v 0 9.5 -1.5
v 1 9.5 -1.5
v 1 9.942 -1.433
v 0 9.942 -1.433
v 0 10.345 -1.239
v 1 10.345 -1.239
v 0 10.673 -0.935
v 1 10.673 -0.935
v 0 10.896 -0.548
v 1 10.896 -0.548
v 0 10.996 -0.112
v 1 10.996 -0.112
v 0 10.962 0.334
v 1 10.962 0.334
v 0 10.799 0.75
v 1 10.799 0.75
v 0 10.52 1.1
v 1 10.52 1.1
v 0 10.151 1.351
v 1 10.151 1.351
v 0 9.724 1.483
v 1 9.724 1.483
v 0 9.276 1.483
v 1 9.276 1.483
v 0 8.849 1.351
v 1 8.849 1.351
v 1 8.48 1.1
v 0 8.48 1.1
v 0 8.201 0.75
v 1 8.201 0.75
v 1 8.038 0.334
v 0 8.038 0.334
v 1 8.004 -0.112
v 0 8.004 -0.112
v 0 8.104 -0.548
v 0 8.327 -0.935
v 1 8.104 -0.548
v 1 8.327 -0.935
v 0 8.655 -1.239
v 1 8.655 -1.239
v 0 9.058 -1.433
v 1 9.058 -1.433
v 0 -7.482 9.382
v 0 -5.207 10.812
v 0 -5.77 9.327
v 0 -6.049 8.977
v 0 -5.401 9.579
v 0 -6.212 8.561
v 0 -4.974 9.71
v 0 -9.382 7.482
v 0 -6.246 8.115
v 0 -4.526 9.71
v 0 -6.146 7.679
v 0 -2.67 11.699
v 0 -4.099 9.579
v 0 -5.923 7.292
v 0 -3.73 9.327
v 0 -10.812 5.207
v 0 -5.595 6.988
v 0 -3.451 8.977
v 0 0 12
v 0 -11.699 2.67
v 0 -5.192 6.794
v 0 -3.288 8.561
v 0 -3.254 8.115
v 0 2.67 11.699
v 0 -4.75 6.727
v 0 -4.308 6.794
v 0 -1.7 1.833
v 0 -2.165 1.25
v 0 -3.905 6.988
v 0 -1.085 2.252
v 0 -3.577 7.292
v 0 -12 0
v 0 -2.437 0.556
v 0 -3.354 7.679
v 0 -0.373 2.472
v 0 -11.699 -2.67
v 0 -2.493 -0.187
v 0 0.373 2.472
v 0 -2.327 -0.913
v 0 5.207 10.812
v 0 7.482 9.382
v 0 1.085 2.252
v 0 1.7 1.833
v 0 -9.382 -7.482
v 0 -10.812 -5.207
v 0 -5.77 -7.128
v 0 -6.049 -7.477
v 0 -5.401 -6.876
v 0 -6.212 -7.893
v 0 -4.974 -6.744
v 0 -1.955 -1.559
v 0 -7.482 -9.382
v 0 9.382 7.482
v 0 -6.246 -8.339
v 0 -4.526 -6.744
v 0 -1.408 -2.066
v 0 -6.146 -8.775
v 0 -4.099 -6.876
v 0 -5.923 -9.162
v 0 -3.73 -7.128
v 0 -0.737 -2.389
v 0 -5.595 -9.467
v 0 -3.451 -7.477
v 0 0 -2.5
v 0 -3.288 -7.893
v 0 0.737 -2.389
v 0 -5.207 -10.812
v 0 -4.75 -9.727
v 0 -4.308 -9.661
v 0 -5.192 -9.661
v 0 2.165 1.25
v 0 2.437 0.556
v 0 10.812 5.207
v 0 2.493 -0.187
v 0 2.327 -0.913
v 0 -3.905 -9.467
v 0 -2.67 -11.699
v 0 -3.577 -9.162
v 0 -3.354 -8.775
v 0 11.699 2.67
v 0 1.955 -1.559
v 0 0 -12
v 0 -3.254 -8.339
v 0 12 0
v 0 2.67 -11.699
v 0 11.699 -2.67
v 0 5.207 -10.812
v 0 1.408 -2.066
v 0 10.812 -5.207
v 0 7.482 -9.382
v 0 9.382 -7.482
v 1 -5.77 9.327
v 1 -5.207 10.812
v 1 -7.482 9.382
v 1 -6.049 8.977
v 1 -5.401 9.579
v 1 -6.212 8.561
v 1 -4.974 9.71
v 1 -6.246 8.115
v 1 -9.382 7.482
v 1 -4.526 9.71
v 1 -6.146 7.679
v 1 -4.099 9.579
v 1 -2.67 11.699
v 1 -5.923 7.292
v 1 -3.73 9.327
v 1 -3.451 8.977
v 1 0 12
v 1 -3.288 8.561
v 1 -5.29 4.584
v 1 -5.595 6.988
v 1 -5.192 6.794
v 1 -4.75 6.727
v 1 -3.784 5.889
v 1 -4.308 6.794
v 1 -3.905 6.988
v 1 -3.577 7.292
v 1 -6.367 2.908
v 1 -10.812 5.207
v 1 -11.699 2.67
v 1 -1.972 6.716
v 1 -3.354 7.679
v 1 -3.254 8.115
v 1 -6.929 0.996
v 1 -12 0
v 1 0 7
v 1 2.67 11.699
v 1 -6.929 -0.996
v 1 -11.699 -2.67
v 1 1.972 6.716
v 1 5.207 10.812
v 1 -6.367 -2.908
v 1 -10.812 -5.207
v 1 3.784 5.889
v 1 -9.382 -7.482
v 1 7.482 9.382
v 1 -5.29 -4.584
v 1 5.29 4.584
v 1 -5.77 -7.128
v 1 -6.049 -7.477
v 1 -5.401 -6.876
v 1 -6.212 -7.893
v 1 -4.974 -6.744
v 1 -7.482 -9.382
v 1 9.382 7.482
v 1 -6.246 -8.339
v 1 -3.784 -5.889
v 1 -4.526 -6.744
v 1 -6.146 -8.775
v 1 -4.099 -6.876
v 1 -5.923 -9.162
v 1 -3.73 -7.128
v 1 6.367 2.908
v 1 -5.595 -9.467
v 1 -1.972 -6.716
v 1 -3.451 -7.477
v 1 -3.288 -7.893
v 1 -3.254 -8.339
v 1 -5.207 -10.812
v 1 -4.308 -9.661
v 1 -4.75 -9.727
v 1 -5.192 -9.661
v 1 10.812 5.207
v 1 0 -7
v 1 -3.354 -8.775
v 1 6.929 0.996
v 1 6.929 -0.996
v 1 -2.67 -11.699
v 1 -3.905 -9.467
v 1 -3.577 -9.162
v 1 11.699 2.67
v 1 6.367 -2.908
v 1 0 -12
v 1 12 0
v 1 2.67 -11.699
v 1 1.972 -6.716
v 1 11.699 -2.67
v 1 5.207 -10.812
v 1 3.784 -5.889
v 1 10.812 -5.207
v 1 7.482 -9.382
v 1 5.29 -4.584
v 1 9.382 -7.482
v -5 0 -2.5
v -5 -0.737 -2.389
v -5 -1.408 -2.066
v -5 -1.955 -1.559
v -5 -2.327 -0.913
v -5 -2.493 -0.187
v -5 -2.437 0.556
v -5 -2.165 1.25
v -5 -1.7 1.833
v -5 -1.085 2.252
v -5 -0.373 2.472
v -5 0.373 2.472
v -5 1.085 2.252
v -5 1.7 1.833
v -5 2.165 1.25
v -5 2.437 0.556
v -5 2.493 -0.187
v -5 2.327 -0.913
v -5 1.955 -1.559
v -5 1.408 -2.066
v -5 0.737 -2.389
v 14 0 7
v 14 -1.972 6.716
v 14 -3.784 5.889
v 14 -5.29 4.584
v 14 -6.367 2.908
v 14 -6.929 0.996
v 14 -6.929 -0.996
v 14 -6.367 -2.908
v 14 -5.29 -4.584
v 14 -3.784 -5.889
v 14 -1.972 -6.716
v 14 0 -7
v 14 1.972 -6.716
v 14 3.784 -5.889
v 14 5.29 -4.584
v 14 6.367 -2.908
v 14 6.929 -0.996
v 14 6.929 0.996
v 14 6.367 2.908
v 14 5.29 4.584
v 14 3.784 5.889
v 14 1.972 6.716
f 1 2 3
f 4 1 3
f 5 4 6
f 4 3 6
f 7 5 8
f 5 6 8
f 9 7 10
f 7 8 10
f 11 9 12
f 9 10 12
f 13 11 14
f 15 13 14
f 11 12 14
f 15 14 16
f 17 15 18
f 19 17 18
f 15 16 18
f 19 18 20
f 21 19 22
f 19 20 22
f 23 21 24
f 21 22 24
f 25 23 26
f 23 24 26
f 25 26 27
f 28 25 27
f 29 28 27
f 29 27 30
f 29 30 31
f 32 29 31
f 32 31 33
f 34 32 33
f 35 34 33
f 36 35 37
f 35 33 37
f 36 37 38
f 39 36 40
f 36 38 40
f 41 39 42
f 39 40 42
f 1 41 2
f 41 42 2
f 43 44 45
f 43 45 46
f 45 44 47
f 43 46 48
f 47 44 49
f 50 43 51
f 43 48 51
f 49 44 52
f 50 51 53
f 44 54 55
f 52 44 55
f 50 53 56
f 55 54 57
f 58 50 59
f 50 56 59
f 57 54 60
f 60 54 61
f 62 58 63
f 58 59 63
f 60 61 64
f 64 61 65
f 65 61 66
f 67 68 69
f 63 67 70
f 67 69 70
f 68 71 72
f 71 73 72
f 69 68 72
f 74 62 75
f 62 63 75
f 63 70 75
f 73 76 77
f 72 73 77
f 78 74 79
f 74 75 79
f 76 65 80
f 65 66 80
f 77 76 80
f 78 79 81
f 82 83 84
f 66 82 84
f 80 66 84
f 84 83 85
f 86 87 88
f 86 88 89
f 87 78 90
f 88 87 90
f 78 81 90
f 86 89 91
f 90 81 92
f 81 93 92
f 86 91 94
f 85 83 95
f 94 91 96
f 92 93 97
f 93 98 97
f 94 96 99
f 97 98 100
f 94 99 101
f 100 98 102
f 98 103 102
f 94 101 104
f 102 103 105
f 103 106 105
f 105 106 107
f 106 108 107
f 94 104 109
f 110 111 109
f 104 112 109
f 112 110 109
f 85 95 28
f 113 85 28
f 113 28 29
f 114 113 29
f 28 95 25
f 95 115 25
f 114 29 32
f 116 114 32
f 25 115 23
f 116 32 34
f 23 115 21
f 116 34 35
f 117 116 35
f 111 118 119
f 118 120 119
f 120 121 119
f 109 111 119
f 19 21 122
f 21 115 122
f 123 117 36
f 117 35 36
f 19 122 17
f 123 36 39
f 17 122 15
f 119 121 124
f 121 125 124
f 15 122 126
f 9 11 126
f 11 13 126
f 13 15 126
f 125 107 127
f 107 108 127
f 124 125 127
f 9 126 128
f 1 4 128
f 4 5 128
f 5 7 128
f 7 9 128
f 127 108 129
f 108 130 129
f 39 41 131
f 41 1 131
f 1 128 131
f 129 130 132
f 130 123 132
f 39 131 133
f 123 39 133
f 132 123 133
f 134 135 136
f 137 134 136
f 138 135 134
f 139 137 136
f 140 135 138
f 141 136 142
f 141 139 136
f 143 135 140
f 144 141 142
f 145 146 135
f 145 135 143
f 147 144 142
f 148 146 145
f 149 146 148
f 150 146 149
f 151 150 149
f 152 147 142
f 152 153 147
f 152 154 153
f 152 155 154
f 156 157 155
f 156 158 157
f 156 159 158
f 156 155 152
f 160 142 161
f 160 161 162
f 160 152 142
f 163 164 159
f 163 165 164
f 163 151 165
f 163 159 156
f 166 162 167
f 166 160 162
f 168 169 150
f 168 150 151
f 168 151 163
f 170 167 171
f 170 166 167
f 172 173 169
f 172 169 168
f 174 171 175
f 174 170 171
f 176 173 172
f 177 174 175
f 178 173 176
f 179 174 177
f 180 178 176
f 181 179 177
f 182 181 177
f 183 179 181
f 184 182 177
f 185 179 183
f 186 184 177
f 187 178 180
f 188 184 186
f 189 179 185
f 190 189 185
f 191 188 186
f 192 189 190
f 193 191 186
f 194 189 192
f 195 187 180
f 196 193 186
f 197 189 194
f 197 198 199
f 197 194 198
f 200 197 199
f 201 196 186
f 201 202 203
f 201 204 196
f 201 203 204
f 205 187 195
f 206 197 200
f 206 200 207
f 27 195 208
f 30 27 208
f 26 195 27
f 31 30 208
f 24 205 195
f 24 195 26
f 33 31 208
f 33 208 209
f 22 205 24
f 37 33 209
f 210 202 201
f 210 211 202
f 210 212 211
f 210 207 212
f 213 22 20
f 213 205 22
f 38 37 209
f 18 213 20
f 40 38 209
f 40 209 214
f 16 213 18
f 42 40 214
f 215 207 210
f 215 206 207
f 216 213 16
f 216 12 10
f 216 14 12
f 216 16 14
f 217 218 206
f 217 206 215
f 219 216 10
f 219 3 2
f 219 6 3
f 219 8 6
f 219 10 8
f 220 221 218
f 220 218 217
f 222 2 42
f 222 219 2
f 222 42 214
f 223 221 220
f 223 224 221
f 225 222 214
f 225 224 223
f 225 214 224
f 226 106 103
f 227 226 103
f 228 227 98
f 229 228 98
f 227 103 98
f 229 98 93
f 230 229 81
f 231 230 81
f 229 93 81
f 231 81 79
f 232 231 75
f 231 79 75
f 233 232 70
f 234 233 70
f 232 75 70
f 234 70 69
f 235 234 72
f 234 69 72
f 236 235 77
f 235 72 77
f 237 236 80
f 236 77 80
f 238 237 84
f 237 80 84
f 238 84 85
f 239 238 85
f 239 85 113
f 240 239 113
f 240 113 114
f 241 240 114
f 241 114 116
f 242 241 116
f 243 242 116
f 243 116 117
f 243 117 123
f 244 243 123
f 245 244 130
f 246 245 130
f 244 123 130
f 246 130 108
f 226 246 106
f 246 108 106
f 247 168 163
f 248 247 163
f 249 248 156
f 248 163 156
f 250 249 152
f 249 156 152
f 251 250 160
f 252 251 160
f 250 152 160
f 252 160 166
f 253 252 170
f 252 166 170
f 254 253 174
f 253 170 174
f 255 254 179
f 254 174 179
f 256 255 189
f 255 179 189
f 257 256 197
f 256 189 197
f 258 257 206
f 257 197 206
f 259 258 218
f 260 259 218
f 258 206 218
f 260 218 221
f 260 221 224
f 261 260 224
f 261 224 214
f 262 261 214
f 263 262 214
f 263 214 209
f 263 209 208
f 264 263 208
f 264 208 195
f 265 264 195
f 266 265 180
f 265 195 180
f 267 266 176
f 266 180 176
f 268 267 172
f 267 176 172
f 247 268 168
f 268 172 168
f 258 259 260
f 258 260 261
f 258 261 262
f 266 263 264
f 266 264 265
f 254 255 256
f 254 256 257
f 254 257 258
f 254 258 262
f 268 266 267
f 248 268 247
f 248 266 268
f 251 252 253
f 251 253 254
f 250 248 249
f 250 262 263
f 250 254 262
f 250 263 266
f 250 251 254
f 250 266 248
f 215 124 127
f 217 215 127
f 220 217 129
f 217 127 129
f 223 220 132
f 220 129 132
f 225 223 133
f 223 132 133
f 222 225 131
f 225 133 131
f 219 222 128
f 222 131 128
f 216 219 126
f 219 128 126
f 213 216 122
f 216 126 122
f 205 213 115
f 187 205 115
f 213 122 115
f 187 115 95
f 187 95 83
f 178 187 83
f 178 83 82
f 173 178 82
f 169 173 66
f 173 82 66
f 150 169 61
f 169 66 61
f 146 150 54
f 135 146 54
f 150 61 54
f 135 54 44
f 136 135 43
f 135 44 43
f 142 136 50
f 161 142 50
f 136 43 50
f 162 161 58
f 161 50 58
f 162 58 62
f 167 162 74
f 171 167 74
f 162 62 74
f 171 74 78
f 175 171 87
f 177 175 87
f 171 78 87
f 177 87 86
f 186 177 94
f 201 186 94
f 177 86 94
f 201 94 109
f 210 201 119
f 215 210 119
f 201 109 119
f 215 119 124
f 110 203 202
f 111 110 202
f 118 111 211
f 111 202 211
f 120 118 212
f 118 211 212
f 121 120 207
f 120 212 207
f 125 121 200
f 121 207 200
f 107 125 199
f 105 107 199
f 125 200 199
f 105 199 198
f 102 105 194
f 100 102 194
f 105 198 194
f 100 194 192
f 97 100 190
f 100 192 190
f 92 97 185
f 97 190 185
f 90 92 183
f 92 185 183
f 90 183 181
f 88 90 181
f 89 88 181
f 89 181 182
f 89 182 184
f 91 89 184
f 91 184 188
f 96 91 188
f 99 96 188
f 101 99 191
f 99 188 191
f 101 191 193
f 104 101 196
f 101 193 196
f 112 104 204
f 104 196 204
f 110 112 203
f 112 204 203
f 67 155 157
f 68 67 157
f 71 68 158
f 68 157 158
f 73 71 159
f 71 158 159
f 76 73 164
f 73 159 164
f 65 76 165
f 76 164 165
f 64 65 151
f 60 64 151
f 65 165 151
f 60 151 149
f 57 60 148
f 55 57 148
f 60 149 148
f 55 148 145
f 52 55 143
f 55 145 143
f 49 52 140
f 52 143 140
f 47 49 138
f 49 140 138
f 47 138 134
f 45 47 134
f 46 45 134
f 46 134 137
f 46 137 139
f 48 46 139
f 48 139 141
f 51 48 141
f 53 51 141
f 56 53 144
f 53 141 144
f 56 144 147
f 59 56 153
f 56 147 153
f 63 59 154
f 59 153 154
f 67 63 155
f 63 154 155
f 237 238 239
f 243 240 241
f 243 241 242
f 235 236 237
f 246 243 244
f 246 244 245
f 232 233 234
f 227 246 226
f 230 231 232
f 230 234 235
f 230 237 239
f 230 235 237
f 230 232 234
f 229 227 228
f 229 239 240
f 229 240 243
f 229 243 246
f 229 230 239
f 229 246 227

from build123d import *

# Parameters (mm, degrees)
SKETCH1_R           = 12
BOSS_EXTRUDE1_DEPTH = 1
SKETCH2_R           = 7
BOSS_EXTRUDE2_DEPTH = 13
SKETCH3_R           = 1.5
CUT_EXTRUDE1_DEPTH  = 1
SKETCH4_R           = 2.5
BOSS_EXTRUDE3_DEPTH = 5


with BuildPart() as part:
    # Sketch1 → Boss-Extrude1 (new body)
    with BuildSketch(Plane(origin=(0, 0, 0), x_dir=(0, 0, -1), z_dir=(1, 0, 0))):
        Circle(SKETCH1_R)
    extrude(amount=BOSS_EXTRUDE1_DEPTH)

    # Sketch2 → Boss-Extrude2 (add)
    with BuildSketch(Plane(origin=(1, 0, 0), x_dir=(0, 0, -1), z_dir=(1, 0, 0))):
        with Locations(Location((0, 0, 0), (0, 0, 180))):
            Circle(SKETCH2_R)
    extrude(amount=BOSS_EXTRUDE2_DEPTH)

    # Sketch3 → Cut-Extrude1 (cut)
    with BuildSketch(Plane(origin=(1, 0, 0), x_dir=(0, 0, -1), z_dir=(1, 0, 0))):
        with Locations((0, 9.5)):
            Circle(SKETCH3_R)
        with Locations((8.227241336, -4.75)):
            Circle(SKETCH3_R)
        with Locations((-8.227241336, -4.75)):
            Circle(SKETCH3_R)
    extrude(amount=-CUT_EXTRUDE1_DEPTH, mode=Mode.SUBTRACT)

    # Sketch4 → Boss-Extrude3 (add)
    with BuildSketch(Plane.ZY):
        with Locations(Location((0, 0, 0), (0, 0, 180))):
            Circle(SKETCH4_R)
    extrude(amount=BOSS_EXTRUDE3_DEPTH)


solid = part.part
